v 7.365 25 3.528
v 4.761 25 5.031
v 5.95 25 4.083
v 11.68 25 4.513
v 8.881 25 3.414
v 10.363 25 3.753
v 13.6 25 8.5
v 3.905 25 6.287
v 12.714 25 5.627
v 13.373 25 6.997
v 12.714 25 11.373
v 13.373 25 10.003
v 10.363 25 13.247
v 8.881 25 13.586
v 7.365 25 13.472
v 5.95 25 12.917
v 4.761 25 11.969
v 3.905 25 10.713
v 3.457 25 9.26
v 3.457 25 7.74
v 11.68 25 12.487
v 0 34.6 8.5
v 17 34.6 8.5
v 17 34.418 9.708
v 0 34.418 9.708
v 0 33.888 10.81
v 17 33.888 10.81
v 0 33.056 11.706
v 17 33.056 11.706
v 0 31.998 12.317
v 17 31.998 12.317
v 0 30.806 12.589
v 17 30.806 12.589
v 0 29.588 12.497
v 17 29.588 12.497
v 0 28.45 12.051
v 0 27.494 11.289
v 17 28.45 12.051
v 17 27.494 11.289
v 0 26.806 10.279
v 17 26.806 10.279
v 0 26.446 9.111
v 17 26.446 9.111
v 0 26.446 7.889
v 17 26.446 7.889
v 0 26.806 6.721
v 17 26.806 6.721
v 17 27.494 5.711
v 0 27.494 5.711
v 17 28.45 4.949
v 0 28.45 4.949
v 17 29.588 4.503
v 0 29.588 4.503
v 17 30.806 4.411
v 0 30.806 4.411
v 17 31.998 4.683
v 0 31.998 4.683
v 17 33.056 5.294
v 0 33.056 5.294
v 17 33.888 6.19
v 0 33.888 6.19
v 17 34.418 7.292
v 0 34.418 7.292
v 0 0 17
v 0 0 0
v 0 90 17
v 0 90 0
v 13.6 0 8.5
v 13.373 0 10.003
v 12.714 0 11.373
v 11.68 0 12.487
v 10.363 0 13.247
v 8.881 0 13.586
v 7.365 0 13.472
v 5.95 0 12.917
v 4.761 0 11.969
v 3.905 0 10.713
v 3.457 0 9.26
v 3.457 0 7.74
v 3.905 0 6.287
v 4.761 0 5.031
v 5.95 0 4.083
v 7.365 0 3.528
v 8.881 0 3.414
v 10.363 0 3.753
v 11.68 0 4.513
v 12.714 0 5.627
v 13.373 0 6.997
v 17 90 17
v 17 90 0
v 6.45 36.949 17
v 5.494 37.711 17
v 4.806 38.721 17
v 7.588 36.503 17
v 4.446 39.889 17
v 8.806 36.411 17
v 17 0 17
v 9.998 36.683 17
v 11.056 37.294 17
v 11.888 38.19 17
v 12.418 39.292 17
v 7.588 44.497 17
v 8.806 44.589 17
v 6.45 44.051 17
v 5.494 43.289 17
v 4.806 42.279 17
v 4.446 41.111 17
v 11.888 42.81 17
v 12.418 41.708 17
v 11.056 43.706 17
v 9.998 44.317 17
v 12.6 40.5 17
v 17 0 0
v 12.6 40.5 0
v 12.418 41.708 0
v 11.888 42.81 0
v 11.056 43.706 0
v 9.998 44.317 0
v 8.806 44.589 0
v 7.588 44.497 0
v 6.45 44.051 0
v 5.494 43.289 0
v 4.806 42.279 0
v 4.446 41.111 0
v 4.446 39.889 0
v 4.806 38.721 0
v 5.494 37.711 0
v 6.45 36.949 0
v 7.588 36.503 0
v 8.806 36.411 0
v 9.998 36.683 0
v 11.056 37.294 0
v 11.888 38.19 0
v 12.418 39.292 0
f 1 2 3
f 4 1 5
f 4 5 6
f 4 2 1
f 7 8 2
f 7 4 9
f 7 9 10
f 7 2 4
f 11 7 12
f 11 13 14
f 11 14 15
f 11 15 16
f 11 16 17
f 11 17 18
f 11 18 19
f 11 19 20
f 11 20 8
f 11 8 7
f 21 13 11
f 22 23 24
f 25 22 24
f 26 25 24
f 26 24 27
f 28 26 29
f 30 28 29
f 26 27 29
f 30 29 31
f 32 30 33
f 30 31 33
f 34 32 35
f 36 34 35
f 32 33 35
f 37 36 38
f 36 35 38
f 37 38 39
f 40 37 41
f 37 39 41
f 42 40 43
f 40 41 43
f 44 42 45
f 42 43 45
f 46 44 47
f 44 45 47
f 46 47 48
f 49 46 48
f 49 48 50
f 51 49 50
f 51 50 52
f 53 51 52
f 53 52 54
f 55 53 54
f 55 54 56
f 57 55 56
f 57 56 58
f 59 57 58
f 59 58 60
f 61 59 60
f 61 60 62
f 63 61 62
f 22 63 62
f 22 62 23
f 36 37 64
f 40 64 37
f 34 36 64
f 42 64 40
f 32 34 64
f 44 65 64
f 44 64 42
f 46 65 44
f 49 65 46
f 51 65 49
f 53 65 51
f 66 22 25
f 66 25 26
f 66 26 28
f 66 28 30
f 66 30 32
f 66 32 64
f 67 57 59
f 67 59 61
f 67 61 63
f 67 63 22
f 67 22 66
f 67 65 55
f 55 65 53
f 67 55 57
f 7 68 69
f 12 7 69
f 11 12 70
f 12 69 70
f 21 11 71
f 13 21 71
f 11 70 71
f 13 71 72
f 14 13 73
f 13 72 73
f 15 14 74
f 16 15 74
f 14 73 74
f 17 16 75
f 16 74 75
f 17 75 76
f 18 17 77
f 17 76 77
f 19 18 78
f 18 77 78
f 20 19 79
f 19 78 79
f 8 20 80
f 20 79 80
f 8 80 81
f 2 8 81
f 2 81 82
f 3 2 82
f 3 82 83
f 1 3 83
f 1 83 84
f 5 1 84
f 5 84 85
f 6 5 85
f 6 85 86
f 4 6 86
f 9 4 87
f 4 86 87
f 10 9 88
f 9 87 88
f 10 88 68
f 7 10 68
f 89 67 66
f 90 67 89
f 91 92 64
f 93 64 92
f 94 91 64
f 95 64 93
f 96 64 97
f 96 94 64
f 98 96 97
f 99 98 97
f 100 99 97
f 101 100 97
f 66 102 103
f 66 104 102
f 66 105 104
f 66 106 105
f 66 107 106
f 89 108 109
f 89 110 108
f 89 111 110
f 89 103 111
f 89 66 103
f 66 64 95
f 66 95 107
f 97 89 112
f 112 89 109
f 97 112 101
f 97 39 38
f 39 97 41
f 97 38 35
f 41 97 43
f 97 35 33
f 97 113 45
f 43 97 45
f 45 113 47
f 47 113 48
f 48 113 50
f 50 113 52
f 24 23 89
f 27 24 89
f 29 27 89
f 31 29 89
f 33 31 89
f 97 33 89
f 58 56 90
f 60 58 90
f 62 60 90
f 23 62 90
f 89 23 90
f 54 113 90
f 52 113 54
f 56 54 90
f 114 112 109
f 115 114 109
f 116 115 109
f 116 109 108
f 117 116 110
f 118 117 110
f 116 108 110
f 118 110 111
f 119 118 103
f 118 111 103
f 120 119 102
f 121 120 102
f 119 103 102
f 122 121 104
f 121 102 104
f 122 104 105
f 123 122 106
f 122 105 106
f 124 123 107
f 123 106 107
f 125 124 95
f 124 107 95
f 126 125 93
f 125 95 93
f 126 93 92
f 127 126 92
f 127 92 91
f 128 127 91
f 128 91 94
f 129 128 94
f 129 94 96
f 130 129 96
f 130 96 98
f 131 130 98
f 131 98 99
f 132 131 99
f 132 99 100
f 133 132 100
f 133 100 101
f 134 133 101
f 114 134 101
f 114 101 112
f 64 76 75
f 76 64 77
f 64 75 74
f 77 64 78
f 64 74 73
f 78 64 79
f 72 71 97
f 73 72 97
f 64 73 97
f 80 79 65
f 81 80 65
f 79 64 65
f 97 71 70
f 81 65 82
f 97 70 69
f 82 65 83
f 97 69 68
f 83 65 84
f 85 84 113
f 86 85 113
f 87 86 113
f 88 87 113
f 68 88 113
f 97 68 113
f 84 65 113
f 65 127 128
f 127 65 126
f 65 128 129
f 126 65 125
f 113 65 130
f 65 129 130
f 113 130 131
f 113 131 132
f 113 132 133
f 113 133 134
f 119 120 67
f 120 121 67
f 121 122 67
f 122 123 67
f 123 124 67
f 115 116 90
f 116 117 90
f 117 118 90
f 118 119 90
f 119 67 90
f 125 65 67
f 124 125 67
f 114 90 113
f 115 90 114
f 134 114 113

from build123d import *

# Parameters (mm, degrees)
SKETCH_W        = 17
SKETCH_H        = 90
PAD_DEPTH       = 17
SKETCH001_R     = 5.1
POCKET_DEPTH    = 25
SKETCH002_R     = 4.1
POCKET001_DEPTH = 17.001
SKETCH003_R     = 4.1
POCKET002_DEPTH = 17.001


with BuildPart() as part:
    # Sketch → Pad (new body)
    with BuildSketch(Plane.XY):
        with Locations((8.5, 45)):
            Rectangle(SKETCH_W, SKETCH_H)
    extrude(amount=PAD_DEPTH)

    # Sketch001 → Pocket (cut)
    with BuildSketch(Plane.XZ):
        with Locations((8.5, 8.5)):
            Circle(SKETCH001_R)
    extrude(amount=-POCKET_DEPTH, mode=Mode.SUBTRACT)

    # Sketch002 → Pocket001 (cut, through all)
    with BuildSketch(Plane.XY.offset(17)):
        with Locations((8.5, 40.5)):
            Circle(SKETCH002_R)
    extrude(amount=-POCKET001_DEPTH, mode=Mode.SUBTRACT)

    # Sketch003 → Pocket002 (cut, through all)
    with BuildSketch(Plane.YZ.offset(17)):
        with Locations((30.5, 8.5)):
            Circle(SKETCH003_R)
    extrude(amount=-POCKET002_DEPTH, mode=Mode.SUBTRACT)


solid = part.part
